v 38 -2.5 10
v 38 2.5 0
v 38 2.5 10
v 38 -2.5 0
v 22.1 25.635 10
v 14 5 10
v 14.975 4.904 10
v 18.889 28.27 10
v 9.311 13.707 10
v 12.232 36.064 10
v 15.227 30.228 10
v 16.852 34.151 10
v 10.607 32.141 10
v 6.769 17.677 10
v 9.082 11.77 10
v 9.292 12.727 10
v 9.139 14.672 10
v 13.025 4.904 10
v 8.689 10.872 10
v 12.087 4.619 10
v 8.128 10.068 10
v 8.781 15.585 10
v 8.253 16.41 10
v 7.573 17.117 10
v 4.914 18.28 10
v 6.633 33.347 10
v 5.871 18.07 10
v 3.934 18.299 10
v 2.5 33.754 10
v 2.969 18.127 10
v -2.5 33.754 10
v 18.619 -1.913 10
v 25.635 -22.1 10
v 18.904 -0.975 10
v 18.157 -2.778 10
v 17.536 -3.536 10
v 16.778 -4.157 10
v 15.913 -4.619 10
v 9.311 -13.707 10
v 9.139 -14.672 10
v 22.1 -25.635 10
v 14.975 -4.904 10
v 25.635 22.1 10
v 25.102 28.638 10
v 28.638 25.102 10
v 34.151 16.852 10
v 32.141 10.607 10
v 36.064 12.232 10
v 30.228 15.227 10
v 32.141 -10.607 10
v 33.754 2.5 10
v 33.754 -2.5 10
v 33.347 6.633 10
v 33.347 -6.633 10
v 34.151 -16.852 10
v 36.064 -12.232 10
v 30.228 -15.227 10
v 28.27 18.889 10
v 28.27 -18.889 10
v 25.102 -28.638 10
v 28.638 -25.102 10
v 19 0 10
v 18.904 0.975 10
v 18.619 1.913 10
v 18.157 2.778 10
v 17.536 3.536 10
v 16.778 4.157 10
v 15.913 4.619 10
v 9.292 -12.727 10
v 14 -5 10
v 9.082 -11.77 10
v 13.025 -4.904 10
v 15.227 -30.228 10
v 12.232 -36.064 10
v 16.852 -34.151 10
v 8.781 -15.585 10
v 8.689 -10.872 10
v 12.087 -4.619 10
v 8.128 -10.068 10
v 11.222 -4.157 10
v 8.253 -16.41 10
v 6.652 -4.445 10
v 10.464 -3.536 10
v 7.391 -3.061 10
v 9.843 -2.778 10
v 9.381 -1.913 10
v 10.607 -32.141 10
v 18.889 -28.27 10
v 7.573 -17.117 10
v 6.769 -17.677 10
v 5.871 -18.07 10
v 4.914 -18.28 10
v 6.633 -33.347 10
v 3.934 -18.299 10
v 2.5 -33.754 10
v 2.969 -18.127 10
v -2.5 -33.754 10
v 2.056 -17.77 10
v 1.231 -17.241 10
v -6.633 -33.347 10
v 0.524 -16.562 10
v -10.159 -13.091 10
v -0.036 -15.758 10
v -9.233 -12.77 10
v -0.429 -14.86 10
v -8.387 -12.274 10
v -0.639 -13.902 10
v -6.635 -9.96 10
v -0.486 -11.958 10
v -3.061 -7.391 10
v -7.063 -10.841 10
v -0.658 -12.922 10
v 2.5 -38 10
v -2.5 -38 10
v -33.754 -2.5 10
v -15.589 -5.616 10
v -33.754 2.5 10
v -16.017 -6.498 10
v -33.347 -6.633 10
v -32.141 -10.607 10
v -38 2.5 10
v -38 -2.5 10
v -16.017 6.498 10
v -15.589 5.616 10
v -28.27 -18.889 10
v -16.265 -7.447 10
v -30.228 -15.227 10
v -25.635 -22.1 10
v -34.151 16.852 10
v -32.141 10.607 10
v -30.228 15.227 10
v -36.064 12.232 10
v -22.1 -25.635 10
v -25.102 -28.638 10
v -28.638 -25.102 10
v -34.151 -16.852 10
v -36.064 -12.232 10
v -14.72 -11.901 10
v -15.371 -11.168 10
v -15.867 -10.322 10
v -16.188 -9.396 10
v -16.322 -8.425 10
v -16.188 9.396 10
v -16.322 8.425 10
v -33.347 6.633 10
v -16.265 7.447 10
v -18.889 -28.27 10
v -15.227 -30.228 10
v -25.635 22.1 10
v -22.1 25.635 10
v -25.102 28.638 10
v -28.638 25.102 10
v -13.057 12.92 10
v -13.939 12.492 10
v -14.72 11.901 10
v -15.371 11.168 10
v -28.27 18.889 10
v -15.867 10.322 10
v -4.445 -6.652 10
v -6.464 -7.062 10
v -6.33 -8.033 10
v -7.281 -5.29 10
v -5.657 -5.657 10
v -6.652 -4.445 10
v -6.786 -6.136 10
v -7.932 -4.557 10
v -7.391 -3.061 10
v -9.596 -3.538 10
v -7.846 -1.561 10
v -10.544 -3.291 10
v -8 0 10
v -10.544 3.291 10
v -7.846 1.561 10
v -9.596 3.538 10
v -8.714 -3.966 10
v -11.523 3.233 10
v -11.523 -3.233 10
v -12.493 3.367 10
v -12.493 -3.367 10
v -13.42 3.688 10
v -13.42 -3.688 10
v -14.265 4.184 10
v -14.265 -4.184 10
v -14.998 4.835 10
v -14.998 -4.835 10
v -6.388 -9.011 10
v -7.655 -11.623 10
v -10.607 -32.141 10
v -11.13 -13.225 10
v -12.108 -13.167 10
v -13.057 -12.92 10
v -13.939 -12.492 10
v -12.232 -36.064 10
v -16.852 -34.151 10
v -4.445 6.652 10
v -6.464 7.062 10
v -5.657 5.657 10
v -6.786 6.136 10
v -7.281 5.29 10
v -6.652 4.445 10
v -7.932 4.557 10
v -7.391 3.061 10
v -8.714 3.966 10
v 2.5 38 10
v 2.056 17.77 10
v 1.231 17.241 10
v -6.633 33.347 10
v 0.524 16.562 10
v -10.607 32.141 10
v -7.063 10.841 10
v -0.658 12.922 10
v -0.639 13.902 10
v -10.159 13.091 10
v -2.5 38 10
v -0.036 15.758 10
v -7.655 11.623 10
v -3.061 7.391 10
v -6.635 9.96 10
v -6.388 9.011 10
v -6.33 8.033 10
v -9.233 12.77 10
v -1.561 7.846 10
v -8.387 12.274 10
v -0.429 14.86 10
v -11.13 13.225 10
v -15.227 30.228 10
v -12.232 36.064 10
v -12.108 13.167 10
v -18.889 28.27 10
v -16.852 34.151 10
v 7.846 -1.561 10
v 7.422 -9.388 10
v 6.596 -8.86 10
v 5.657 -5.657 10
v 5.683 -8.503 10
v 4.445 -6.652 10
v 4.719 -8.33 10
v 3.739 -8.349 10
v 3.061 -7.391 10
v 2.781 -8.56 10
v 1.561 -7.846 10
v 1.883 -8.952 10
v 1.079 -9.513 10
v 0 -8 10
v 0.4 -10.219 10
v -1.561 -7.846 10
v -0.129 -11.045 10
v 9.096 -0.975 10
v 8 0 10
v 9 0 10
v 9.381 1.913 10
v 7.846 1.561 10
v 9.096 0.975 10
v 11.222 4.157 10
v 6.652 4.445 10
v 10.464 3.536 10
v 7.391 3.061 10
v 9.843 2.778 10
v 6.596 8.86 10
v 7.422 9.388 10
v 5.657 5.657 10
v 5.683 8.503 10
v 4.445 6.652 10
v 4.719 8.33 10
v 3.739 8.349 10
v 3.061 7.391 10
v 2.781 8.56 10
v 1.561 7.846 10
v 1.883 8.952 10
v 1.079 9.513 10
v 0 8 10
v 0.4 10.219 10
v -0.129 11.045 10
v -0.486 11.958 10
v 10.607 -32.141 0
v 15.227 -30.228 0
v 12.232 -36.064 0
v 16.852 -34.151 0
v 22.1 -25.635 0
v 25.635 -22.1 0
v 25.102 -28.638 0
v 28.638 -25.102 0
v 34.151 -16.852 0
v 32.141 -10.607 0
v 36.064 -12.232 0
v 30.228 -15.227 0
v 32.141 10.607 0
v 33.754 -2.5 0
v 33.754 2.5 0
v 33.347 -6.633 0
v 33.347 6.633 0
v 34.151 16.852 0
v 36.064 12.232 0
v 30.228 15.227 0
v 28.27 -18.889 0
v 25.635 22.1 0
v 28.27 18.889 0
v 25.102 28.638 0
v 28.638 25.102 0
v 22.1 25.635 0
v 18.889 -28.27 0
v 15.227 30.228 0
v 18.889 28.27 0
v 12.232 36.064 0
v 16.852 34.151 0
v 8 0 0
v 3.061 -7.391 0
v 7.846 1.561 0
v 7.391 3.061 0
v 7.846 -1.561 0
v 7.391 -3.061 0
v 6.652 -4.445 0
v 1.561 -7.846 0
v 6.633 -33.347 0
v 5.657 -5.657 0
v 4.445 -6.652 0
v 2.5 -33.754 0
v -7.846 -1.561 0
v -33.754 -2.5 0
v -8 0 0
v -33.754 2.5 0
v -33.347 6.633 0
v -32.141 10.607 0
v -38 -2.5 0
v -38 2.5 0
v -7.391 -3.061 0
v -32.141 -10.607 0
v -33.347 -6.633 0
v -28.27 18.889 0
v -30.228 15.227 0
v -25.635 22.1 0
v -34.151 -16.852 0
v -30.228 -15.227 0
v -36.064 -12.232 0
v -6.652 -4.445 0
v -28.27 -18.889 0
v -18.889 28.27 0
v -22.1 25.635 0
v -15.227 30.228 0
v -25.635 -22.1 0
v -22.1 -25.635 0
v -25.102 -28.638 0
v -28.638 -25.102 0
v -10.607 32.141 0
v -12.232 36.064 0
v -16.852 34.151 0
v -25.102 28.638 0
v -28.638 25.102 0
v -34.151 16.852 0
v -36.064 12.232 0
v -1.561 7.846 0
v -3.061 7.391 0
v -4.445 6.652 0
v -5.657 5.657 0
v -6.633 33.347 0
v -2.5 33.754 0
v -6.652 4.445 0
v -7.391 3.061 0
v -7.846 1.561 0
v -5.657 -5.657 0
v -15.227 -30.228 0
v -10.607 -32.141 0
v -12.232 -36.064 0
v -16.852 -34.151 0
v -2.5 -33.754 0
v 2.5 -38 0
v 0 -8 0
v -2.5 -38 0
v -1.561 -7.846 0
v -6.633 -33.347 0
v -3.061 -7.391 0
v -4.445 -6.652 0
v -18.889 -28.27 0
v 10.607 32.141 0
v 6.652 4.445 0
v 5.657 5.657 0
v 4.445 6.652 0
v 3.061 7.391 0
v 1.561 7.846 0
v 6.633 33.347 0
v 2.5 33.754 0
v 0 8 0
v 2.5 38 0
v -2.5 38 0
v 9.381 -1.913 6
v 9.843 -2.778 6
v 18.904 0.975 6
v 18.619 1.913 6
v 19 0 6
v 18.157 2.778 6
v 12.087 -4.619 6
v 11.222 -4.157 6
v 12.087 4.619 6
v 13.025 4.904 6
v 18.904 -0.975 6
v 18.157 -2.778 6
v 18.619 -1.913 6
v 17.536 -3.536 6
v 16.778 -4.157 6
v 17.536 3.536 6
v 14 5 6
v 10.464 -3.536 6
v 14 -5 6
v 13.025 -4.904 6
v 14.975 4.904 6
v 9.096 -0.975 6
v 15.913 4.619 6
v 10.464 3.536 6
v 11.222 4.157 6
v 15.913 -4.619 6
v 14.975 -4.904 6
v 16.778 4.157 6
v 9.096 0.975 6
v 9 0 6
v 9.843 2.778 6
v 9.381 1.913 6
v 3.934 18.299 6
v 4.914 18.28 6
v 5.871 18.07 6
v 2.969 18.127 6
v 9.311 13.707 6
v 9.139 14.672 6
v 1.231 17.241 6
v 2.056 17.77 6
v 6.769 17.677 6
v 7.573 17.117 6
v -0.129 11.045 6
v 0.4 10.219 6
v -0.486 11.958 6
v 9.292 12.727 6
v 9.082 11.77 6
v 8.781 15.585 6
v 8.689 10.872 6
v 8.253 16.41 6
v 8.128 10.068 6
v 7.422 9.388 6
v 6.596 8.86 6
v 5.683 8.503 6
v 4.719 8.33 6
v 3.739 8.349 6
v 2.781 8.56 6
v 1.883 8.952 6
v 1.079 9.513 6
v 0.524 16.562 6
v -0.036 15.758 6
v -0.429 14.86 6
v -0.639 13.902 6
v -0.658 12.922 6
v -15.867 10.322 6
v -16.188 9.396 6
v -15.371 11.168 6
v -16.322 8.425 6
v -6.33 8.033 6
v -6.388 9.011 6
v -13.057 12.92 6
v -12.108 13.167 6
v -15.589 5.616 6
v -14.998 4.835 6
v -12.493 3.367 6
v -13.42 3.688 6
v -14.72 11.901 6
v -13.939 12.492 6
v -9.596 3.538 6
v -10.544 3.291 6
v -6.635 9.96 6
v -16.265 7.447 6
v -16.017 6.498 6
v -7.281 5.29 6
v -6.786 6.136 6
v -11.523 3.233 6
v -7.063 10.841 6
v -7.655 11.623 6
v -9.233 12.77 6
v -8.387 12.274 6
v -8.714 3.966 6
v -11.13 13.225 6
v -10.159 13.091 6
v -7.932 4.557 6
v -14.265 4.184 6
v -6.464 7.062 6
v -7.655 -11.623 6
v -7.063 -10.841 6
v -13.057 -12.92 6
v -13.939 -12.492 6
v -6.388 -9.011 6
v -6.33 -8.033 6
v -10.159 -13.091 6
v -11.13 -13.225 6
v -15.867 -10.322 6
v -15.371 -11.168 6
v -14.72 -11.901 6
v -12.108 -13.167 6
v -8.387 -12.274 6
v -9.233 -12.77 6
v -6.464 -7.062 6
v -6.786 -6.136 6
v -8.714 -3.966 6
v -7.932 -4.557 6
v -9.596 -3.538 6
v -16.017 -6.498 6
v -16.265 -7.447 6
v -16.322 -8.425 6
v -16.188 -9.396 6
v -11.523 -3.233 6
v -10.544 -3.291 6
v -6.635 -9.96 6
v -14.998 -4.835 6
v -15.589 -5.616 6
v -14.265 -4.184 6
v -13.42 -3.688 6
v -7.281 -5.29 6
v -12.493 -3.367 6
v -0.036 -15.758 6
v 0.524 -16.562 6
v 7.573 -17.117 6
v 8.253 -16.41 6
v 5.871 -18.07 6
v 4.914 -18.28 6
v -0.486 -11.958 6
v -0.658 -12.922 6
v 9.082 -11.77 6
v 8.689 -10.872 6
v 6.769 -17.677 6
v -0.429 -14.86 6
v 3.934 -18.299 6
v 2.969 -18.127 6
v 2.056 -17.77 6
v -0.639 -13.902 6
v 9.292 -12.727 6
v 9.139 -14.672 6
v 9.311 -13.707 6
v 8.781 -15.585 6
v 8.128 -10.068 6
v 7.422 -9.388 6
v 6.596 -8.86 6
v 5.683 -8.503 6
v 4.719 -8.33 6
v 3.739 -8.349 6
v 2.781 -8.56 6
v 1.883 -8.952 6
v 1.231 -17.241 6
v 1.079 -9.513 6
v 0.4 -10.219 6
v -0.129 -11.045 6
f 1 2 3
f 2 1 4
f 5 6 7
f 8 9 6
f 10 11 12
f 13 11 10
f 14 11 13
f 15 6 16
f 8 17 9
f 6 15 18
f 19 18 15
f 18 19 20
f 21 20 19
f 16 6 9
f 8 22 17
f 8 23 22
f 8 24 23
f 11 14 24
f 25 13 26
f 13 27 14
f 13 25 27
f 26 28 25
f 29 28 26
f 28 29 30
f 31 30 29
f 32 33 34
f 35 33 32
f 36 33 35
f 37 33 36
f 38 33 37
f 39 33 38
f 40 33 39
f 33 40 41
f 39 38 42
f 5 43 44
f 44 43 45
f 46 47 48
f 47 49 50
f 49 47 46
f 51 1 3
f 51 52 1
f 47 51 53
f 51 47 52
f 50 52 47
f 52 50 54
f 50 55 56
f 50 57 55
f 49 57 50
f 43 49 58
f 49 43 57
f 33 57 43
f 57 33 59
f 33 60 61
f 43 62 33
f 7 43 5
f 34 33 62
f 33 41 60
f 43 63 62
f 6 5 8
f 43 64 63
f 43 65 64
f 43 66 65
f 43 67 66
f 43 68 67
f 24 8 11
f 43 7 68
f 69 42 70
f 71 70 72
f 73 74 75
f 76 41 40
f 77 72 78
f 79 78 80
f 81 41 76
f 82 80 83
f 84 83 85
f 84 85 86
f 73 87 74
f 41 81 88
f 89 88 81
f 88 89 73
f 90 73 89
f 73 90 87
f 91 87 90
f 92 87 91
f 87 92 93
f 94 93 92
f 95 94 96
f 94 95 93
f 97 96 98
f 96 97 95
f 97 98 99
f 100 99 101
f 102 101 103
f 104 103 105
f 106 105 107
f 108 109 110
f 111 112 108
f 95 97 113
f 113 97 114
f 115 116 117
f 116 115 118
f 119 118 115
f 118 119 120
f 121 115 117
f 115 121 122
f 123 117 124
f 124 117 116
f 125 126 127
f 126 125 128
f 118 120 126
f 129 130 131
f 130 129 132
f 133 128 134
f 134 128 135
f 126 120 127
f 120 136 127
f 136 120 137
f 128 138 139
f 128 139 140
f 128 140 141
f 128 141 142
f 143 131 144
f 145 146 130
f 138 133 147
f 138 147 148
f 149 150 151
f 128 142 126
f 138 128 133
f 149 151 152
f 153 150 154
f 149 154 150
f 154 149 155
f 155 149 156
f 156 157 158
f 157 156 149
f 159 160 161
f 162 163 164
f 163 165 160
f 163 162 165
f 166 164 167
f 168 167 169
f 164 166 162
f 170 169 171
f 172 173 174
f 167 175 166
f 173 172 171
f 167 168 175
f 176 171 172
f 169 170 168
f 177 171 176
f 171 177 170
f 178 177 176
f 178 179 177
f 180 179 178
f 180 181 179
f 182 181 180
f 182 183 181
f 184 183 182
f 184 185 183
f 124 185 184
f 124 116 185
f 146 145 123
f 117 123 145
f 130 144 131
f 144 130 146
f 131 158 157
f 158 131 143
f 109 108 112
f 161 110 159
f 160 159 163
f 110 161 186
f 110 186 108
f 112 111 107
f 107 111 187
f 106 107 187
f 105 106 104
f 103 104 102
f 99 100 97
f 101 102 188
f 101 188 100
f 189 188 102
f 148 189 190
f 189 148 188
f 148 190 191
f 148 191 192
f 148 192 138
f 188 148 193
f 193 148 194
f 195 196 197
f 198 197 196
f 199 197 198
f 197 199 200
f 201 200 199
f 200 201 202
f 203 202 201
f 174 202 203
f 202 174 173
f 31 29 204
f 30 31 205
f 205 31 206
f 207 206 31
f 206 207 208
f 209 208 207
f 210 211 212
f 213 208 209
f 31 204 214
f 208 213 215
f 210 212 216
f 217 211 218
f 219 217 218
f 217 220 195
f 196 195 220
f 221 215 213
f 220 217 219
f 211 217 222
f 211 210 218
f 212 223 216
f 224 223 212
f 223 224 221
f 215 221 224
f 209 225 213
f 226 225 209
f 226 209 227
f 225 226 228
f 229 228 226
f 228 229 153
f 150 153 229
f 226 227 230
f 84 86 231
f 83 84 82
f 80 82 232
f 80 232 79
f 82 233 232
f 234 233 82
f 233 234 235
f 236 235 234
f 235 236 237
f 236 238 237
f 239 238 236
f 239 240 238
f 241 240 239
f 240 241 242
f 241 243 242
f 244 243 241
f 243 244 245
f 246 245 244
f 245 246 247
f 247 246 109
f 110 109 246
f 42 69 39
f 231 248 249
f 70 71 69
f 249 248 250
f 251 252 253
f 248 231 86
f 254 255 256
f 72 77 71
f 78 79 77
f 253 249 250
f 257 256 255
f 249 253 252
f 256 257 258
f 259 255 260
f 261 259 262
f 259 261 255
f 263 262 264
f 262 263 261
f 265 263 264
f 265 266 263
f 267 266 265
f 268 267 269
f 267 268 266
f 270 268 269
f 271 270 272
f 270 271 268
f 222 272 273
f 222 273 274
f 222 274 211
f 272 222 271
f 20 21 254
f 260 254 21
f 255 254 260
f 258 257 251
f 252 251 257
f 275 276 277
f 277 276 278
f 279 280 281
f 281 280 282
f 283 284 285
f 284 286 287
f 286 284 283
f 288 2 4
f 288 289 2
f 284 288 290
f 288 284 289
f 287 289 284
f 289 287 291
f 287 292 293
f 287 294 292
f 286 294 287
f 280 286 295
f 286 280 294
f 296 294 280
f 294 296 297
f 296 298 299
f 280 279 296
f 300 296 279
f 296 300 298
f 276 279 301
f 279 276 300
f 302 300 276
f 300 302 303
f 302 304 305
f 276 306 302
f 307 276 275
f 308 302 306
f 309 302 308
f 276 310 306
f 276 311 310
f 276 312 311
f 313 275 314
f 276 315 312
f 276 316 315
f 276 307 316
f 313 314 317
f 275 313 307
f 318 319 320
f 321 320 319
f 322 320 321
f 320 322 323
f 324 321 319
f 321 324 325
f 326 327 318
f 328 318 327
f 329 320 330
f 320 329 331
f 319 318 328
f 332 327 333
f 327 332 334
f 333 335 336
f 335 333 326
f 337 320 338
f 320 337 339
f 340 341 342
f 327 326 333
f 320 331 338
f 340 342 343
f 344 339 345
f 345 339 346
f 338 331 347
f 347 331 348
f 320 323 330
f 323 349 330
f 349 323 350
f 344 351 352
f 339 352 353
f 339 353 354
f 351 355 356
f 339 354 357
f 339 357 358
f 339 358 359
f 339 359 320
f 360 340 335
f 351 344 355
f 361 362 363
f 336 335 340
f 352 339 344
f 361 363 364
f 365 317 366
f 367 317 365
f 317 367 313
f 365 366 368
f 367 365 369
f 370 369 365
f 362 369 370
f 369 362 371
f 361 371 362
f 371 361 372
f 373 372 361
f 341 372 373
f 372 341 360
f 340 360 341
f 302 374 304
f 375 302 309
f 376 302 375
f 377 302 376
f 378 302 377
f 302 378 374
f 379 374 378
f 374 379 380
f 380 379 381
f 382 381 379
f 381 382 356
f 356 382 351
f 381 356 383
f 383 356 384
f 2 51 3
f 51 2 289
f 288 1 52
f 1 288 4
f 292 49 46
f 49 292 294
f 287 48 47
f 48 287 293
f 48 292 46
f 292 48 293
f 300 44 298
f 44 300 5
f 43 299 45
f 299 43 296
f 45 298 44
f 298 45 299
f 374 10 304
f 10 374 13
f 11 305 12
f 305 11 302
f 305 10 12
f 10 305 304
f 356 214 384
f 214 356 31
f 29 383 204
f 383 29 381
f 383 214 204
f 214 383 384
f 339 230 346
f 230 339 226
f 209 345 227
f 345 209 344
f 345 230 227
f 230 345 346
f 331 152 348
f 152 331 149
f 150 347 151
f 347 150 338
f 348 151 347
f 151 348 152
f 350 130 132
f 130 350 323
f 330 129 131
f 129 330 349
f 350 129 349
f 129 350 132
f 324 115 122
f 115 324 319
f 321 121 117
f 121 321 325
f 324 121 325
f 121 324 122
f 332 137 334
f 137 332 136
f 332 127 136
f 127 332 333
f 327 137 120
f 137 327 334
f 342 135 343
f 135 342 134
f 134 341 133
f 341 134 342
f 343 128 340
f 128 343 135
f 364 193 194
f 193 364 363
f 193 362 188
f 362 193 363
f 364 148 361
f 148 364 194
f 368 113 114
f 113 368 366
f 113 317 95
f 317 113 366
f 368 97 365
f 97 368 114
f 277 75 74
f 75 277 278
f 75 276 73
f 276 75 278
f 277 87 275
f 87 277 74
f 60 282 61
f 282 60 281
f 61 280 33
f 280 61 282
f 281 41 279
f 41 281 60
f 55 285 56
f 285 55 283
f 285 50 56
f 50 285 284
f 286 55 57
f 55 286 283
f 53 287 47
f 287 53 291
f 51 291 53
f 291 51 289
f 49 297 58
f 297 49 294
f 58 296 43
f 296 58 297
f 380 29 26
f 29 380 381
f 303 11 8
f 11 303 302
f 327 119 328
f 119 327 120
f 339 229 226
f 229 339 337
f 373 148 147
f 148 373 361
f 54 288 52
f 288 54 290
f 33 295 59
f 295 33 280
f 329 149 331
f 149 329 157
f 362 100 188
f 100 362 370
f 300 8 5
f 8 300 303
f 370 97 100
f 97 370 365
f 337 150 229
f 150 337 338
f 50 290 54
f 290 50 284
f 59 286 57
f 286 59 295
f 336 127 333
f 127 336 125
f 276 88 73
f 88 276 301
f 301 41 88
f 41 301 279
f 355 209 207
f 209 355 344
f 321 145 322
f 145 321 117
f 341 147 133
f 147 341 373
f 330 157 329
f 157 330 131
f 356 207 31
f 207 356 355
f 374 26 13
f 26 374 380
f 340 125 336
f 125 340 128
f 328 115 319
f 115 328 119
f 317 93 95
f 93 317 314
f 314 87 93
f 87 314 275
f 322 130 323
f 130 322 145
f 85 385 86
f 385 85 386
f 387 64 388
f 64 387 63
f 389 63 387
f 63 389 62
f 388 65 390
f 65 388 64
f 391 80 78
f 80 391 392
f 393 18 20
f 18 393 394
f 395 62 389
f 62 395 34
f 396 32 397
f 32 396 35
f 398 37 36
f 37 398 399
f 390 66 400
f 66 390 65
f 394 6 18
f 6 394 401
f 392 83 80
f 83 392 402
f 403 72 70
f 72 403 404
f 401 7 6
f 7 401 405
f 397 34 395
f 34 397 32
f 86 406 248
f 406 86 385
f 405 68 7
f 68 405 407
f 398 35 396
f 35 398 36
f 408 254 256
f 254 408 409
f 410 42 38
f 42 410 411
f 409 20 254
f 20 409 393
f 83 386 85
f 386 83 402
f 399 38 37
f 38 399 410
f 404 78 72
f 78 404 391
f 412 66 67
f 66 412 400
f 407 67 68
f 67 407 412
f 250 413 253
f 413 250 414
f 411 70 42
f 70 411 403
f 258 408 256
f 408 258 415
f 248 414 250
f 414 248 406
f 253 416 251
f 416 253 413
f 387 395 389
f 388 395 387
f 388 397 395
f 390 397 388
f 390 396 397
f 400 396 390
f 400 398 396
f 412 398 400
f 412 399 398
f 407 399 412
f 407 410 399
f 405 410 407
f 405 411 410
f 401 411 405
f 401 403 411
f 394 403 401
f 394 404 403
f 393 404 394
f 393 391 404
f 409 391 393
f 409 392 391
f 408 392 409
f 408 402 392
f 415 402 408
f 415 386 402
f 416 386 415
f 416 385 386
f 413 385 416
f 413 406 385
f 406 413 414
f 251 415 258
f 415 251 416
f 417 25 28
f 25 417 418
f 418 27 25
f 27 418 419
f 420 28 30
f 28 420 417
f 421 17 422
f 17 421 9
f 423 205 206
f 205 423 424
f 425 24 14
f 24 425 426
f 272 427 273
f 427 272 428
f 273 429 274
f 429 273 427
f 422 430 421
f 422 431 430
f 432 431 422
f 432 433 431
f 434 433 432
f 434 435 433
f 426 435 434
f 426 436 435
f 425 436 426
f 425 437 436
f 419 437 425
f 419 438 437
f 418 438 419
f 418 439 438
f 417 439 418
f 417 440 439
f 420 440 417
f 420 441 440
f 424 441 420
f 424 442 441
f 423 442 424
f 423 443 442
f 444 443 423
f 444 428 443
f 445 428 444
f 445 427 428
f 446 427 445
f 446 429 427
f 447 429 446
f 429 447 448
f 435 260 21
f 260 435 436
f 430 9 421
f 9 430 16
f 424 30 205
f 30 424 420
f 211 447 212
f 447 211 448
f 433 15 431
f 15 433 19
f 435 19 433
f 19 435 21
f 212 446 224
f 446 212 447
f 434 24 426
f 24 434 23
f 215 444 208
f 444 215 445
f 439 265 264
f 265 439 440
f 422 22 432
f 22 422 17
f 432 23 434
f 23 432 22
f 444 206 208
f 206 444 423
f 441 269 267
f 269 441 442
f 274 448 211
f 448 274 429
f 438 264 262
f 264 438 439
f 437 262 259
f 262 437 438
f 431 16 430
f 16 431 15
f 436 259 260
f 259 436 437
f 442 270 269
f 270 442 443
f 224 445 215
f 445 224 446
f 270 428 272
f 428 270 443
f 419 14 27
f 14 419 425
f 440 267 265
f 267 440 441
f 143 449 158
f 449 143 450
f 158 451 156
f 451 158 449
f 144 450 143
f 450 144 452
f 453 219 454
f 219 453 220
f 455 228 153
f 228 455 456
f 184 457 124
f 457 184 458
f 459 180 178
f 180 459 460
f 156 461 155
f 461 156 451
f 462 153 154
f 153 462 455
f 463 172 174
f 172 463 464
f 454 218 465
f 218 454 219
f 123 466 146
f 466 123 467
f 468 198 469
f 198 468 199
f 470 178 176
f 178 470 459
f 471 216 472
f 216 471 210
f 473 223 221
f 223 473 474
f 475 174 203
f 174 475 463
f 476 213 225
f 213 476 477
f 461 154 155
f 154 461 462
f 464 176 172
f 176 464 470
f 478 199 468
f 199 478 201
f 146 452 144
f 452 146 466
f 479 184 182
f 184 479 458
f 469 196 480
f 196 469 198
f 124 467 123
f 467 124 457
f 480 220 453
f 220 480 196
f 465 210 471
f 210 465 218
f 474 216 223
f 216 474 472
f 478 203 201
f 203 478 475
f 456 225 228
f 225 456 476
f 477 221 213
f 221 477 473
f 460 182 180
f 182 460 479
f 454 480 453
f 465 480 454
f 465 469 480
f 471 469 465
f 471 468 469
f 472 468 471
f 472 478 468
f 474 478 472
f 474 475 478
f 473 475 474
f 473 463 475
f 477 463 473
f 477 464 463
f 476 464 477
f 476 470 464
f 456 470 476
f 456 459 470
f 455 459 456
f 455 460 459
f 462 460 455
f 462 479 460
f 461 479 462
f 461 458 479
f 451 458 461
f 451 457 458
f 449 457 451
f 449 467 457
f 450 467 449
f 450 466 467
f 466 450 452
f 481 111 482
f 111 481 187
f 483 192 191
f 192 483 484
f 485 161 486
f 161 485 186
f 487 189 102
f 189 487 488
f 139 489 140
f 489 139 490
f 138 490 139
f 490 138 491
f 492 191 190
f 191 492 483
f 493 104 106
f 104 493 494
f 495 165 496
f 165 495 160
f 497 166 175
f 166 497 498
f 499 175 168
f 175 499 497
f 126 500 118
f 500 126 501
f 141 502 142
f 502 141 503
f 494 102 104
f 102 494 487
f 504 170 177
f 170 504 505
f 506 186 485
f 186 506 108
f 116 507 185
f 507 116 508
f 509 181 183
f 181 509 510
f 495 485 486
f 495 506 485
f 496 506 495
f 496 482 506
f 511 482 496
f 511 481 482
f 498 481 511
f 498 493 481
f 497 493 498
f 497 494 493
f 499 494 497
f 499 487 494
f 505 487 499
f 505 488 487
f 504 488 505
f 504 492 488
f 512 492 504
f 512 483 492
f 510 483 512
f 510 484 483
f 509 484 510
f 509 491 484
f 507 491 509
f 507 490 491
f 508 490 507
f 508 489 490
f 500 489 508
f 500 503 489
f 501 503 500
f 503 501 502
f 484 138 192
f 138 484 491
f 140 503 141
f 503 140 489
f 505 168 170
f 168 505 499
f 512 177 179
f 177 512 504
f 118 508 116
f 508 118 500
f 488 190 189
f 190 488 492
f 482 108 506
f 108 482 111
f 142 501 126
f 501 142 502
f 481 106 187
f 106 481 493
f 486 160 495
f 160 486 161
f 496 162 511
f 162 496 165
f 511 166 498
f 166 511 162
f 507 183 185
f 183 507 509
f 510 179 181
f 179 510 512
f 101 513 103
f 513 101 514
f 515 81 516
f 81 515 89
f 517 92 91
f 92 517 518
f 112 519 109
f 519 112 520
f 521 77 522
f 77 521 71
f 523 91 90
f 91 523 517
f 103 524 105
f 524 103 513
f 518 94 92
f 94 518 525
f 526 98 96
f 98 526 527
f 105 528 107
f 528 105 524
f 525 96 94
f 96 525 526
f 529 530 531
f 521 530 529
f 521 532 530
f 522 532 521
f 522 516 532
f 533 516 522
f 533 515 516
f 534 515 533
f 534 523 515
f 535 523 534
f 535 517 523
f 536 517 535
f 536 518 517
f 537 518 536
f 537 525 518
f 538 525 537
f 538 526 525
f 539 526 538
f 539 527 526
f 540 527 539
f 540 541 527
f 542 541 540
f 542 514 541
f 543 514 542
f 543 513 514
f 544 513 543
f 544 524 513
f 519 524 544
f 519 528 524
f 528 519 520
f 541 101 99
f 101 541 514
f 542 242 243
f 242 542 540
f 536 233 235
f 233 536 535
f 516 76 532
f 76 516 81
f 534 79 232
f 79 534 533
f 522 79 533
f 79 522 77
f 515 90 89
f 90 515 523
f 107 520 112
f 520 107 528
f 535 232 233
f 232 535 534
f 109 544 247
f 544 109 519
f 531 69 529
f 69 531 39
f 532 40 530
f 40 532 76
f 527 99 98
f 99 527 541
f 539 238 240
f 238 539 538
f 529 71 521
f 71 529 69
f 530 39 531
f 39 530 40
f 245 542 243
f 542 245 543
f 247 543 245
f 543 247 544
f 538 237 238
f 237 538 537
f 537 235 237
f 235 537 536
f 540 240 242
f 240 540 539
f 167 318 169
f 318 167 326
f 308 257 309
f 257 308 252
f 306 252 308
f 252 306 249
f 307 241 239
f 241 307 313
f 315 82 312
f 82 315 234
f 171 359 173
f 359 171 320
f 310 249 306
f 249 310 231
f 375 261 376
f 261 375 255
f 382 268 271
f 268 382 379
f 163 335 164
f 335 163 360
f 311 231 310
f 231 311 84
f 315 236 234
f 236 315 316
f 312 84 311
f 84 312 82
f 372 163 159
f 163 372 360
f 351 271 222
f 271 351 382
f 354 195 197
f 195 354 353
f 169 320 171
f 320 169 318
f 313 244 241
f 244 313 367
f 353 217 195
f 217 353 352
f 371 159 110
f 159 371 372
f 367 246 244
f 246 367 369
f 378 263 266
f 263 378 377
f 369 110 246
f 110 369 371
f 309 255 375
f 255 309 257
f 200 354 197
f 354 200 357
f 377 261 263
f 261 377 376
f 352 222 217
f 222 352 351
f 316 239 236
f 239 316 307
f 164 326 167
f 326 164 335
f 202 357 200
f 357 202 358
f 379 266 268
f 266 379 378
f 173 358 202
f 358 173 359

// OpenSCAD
$fn = 32;

// ----------------------------------------------------------------------
// Spur blank: lightened gear blank
// ----------------------------------------------------------------------

// --- parameters (mm) ---
disc_r = 34;              // blank root radius
disc_t = 10;              // blank thickness
n_teeth = 16;             // stub tooth count
tooth_w = 5;              // tooth width at the root
tooth_h = 4;              // tooth height above the root
bore_r = 8;               // central bore radius
ring_r = 14;              // lightening pocket ring radius
pocket_r = 5;             // lightening pocket radius

out_r = disc_r + tooth_h;  // tip radius
bbox_x = 76.0;  // measured width over the teeth
bbox_y = 76.0;  // measured depth over the teeth

difference() {
union() {
  cylinder(r = disc_r, h = disc_t);
  for (i = [0 : n_teeth - 1])
    rotate([0, 0, i * 360 / n_teeth])
      translate([disc_r - 1, -tooth_w / 2, 0])
        cube([tooth_h + 1, tooth_w, disc_t]);
}
  translate([0, 0, -1]) cylinder(r = bore_r, h = disc_t + 2);
  for (i = [0 : 5])
    rotate([0, 0, i * 72])
      translate([ring_r, 0, disc_t - 4])
        cylinder(r = pocket_r, h = 5);
}
